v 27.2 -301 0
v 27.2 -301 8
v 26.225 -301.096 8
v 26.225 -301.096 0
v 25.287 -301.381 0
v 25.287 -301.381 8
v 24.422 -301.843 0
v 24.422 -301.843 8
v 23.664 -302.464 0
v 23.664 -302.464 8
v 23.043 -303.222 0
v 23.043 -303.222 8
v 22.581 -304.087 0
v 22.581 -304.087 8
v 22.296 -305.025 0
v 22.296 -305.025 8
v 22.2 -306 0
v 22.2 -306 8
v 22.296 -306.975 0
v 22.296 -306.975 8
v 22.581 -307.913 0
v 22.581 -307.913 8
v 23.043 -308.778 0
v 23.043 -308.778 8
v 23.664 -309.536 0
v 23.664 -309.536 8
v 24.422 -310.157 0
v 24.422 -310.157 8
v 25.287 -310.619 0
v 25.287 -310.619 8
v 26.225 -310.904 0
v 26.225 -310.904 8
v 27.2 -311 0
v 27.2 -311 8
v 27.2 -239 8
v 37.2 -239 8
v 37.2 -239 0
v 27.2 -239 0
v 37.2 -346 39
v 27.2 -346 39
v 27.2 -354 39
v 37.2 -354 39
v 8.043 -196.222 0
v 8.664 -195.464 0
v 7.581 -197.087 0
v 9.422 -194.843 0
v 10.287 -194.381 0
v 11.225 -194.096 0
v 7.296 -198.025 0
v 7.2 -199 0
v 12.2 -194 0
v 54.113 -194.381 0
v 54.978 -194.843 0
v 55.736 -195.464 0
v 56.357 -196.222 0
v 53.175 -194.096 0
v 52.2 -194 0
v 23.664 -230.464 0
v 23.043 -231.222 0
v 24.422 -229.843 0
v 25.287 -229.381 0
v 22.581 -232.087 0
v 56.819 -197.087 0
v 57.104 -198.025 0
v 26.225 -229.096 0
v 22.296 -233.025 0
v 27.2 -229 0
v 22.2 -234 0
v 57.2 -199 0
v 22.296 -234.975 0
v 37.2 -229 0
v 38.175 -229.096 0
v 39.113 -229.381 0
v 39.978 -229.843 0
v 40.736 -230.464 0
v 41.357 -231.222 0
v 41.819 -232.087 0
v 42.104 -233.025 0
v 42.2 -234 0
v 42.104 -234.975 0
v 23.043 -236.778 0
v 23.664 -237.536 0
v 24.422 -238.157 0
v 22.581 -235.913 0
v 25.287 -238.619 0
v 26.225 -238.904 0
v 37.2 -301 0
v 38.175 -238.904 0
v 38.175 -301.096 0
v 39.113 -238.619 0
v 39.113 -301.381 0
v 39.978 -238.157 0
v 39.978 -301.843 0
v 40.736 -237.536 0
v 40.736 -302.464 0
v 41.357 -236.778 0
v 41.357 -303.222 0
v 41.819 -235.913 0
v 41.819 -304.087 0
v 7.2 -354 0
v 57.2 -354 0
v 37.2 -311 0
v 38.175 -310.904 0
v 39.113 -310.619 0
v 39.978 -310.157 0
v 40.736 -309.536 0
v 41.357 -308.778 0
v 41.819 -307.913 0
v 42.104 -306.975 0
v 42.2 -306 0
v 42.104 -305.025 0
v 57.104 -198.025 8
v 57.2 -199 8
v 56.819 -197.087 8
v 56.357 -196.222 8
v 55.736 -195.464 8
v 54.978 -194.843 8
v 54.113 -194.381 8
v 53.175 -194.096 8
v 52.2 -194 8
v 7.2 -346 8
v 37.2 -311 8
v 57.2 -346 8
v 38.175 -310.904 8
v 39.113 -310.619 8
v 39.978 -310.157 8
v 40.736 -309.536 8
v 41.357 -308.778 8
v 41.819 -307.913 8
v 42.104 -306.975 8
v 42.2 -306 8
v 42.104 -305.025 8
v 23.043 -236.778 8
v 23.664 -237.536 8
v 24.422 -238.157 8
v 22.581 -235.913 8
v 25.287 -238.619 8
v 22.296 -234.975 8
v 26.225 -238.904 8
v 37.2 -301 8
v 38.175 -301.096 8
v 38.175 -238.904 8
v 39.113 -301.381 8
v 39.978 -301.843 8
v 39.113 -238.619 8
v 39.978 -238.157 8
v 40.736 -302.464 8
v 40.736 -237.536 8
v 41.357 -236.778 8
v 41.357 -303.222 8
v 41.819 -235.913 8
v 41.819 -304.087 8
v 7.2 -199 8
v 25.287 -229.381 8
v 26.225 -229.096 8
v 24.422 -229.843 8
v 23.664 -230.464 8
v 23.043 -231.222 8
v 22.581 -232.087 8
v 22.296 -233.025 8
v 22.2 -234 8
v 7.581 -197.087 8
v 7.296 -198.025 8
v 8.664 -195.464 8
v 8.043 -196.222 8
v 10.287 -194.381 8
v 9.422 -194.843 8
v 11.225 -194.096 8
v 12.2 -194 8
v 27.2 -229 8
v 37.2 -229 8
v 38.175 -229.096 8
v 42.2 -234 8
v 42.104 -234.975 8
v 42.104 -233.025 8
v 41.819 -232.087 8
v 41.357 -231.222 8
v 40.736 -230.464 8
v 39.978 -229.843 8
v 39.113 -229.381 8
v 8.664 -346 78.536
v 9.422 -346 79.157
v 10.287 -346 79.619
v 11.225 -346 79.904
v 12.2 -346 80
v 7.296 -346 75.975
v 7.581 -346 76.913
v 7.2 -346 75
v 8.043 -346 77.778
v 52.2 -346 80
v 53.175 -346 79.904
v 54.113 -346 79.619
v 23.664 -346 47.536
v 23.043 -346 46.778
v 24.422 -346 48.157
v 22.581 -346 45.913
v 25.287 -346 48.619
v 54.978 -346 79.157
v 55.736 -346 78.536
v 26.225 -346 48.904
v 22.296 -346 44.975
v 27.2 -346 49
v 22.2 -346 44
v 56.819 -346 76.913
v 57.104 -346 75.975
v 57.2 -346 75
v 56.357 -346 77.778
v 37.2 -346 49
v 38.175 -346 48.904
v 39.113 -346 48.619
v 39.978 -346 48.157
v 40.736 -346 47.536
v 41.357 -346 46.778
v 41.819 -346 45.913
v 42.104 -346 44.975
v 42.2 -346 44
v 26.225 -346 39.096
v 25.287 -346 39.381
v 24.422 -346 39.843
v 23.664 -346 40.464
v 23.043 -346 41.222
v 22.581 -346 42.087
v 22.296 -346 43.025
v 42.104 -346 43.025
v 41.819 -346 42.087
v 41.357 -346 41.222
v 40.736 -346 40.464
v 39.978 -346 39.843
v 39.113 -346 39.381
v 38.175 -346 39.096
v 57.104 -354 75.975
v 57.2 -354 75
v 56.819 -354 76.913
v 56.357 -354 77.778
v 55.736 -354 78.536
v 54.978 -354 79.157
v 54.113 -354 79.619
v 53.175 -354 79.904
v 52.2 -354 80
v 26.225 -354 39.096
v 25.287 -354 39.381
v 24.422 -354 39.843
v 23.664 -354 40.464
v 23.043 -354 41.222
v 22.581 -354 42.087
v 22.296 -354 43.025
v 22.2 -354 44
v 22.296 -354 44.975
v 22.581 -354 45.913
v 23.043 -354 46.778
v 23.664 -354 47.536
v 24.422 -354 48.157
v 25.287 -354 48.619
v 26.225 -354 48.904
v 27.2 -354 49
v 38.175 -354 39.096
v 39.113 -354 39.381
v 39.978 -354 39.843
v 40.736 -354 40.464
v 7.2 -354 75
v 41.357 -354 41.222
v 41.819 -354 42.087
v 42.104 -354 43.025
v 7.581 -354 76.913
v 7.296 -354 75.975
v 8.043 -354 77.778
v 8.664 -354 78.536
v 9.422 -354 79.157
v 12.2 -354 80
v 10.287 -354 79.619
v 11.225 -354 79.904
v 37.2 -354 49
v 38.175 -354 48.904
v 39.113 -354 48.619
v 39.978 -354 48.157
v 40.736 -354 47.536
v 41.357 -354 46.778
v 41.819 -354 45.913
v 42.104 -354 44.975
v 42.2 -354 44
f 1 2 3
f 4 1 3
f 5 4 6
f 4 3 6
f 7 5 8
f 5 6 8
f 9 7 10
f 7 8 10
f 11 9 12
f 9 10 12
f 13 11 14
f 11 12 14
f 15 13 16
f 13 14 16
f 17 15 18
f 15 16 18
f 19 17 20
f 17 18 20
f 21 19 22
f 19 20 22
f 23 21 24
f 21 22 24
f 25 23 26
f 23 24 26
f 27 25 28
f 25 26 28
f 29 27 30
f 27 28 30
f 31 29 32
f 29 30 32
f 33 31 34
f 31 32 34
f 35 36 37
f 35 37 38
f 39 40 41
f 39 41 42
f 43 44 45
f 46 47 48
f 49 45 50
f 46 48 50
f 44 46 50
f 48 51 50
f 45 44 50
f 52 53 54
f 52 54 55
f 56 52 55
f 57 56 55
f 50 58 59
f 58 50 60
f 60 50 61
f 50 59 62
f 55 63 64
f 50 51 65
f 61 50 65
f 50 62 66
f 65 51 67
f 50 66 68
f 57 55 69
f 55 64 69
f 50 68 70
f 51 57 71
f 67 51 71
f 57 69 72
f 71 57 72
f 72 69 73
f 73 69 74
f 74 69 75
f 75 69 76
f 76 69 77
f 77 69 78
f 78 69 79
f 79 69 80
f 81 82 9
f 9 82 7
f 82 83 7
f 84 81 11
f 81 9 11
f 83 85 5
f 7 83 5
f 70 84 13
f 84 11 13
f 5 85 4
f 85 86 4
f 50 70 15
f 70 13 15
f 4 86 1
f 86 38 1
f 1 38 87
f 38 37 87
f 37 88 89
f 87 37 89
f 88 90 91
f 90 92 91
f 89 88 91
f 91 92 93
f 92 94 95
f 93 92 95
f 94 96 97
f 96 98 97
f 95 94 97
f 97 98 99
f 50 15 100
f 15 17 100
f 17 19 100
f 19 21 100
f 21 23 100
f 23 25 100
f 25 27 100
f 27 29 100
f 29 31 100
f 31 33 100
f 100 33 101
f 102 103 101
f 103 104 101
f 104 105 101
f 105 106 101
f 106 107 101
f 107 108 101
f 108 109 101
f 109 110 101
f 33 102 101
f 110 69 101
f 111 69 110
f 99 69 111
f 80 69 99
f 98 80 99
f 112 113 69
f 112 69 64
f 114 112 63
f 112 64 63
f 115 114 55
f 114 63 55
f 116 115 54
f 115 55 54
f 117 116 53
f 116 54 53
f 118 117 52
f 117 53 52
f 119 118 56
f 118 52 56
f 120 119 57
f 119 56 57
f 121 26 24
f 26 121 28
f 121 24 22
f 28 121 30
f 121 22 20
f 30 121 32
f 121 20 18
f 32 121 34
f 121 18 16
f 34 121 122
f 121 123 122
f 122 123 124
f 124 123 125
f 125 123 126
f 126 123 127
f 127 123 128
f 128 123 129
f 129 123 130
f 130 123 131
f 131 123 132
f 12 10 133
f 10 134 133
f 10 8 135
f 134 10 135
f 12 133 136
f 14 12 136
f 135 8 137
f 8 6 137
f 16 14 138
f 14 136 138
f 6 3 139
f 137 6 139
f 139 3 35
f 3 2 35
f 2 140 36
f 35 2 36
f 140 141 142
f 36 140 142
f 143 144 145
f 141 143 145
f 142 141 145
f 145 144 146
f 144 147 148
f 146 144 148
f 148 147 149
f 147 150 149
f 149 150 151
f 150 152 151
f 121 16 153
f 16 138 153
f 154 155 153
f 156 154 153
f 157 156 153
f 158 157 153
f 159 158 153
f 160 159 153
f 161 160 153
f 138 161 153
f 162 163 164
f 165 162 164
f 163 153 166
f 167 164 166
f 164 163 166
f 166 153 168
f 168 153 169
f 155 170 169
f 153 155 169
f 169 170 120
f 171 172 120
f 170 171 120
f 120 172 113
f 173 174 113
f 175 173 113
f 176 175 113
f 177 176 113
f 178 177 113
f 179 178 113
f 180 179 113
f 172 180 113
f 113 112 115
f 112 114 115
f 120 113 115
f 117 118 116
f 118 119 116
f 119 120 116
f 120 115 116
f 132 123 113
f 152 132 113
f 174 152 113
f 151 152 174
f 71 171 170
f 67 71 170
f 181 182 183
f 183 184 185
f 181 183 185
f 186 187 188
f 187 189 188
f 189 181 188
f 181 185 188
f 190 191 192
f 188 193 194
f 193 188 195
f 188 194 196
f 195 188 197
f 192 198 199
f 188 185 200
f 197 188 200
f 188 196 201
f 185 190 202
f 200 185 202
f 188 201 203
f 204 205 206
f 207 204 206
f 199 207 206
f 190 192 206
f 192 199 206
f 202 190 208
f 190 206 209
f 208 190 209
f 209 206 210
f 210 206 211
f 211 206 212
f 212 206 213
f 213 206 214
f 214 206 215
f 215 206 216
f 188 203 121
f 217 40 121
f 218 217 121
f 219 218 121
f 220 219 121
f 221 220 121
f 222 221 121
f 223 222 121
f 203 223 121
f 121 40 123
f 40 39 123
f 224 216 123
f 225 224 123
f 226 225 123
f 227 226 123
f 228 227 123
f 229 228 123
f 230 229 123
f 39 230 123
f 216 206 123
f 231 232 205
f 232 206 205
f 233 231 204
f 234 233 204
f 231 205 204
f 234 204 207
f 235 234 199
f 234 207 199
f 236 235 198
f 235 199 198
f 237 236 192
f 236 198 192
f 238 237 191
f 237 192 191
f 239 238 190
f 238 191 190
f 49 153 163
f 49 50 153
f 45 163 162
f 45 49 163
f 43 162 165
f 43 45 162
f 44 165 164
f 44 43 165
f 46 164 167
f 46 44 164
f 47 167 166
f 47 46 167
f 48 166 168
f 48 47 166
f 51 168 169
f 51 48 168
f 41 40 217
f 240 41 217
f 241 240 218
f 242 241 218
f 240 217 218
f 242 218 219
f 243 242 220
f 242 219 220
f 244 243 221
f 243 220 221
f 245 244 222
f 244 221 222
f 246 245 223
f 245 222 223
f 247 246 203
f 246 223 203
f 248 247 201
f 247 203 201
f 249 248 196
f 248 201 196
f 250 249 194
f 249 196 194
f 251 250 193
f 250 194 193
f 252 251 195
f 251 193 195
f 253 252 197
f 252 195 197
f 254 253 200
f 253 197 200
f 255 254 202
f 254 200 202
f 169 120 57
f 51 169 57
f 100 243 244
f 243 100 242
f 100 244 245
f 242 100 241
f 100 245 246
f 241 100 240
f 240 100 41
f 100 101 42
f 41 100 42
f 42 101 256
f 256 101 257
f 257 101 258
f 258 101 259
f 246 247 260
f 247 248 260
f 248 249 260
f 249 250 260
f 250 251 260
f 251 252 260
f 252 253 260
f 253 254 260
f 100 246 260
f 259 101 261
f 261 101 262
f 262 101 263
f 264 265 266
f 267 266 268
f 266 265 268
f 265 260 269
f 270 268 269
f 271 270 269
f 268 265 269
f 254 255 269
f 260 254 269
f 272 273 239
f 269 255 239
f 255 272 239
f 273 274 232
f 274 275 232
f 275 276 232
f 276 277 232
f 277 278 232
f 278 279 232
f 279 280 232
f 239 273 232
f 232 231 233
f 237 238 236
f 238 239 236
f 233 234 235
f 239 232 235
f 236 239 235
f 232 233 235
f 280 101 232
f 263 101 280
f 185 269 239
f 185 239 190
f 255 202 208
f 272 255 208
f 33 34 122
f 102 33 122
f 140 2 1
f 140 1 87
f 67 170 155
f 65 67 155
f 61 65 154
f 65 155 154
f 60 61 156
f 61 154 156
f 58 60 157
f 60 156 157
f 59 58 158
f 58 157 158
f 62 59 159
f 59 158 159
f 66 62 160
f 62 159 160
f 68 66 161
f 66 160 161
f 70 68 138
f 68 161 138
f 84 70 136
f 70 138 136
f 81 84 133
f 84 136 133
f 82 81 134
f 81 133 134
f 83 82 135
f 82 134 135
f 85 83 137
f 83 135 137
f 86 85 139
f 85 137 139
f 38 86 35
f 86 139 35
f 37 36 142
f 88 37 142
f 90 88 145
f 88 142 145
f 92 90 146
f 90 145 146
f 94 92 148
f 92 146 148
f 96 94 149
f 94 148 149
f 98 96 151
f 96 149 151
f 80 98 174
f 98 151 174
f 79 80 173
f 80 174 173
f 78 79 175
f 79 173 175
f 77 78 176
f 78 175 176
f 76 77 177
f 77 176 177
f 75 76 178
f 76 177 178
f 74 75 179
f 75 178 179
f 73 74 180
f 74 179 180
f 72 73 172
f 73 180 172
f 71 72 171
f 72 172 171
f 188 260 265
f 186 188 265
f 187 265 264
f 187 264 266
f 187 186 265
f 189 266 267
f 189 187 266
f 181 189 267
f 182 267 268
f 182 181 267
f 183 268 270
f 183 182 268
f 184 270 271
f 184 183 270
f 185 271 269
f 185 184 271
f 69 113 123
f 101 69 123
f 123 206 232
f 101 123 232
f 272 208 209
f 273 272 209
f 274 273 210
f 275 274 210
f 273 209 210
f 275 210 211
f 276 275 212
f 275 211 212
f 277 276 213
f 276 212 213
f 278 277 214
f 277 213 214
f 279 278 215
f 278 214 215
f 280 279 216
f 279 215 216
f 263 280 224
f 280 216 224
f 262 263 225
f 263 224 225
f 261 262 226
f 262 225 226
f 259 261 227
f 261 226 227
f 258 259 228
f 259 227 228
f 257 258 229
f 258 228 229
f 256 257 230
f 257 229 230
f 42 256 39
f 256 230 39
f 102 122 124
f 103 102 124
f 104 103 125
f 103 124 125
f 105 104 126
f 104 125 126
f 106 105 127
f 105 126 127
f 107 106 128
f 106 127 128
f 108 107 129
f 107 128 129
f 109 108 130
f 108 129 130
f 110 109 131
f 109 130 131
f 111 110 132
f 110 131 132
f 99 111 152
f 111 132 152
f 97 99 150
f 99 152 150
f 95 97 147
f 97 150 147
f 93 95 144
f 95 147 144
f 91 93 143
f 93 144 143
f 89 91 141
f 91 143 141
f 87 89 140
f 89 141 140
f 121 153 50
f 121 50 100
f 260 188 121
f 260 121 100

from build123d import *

# Parameters (mm, degrees)
PAD002_DEPTH            = 25
POCKET002_DEPTH         = 8.001
POCKET003_DEPTH         = 8.001
FILLET_R                = 5
BODY002_ROLL_ANGLE      = 90
BODY002_PLACEMENT_ANGLE = 90


with BuildPart() as part:
    # Sketch008 → Pad002 (new body, symmetric)
    with BuildSketch(Plane.XY):
        Polygon((0, 0), (0, 80), (8, 80), (8, 8), (160, 8), (160, 0), align=None)
    extrude(amount=PAD002_DEPTH, both=True)

    # Sketch009 (on Face4 of Pad002) → Pocket002 (cut, through all)
    with BuildSketch(Plane(origin=(0, 8, 0), x_dir=(-1, 0, 0), z_dir=(0, 1, 0))):
        with BuildLine():
            ThreePointArc((-115, 5), (-120, 10), (-125, 5))
            Line((-125, 5), (-125, -5))
            ThreePointArc((-125, -5), (-120, -10), (-115, -5))
            Line((-115, 5), (-115, -5))
        make_face()
        with BuildLine():
            ThreePointArc((-53, -5), (-48, -10), (-43, -5))
            Line((-43, -5), (-43, 5))
            ThreePointArc((-43, 5), (-48, 10), (-53, 5))
            Line((-53, -5), (-53, 5))
        make_face()
    extrude(amount=-POCKET002_DEPTH, mode=Mode.SUBTRACT)

    # Sketch010 (on Face15 of Pocket002) → Pocket003 (cut, through all)
    with BuildSketch(Plane.YZ.offset(8)):
        with BuildLine():
            ThreePointArc((39, -5), (44, -10), (49, -5))
            Line((49, -5), (49, 5))
            ThreePointArc((49, 5), (44, 10), (39, 5))
            Line((39, -5), (39, 5))
        make_face()
    extrude(amount=-POCKET003_DEPTH, mode=Mode.SUBTRACT)

    # Fillet
    fillet_edges = [part.edges().sort_by_distance(p)[0] for p in [
        (4, 80, 25),
        (4, 80, -25),
        (160, 4, -25),
        (160, 4, 25),
    ]]
    fillet(fillet_edges, radius=FILLET_R)


with BuildPart() as part_1:
    # Body002 roll: moved
    add(part.part.rotate(Axis((0, 0, 0), (1, 0, 0)), BODY002_ROLL_ANGLE))


with BuildPart() as part_2:
    # Body002 placement: moved
    add(part_1.part.moved(Location((32.2, -354, 0))).rotate(Axis((32.2, -354, 0), (0, 0, 1)), BODY002_PLACEMENT_ANGLE))


solid = part_2.part
